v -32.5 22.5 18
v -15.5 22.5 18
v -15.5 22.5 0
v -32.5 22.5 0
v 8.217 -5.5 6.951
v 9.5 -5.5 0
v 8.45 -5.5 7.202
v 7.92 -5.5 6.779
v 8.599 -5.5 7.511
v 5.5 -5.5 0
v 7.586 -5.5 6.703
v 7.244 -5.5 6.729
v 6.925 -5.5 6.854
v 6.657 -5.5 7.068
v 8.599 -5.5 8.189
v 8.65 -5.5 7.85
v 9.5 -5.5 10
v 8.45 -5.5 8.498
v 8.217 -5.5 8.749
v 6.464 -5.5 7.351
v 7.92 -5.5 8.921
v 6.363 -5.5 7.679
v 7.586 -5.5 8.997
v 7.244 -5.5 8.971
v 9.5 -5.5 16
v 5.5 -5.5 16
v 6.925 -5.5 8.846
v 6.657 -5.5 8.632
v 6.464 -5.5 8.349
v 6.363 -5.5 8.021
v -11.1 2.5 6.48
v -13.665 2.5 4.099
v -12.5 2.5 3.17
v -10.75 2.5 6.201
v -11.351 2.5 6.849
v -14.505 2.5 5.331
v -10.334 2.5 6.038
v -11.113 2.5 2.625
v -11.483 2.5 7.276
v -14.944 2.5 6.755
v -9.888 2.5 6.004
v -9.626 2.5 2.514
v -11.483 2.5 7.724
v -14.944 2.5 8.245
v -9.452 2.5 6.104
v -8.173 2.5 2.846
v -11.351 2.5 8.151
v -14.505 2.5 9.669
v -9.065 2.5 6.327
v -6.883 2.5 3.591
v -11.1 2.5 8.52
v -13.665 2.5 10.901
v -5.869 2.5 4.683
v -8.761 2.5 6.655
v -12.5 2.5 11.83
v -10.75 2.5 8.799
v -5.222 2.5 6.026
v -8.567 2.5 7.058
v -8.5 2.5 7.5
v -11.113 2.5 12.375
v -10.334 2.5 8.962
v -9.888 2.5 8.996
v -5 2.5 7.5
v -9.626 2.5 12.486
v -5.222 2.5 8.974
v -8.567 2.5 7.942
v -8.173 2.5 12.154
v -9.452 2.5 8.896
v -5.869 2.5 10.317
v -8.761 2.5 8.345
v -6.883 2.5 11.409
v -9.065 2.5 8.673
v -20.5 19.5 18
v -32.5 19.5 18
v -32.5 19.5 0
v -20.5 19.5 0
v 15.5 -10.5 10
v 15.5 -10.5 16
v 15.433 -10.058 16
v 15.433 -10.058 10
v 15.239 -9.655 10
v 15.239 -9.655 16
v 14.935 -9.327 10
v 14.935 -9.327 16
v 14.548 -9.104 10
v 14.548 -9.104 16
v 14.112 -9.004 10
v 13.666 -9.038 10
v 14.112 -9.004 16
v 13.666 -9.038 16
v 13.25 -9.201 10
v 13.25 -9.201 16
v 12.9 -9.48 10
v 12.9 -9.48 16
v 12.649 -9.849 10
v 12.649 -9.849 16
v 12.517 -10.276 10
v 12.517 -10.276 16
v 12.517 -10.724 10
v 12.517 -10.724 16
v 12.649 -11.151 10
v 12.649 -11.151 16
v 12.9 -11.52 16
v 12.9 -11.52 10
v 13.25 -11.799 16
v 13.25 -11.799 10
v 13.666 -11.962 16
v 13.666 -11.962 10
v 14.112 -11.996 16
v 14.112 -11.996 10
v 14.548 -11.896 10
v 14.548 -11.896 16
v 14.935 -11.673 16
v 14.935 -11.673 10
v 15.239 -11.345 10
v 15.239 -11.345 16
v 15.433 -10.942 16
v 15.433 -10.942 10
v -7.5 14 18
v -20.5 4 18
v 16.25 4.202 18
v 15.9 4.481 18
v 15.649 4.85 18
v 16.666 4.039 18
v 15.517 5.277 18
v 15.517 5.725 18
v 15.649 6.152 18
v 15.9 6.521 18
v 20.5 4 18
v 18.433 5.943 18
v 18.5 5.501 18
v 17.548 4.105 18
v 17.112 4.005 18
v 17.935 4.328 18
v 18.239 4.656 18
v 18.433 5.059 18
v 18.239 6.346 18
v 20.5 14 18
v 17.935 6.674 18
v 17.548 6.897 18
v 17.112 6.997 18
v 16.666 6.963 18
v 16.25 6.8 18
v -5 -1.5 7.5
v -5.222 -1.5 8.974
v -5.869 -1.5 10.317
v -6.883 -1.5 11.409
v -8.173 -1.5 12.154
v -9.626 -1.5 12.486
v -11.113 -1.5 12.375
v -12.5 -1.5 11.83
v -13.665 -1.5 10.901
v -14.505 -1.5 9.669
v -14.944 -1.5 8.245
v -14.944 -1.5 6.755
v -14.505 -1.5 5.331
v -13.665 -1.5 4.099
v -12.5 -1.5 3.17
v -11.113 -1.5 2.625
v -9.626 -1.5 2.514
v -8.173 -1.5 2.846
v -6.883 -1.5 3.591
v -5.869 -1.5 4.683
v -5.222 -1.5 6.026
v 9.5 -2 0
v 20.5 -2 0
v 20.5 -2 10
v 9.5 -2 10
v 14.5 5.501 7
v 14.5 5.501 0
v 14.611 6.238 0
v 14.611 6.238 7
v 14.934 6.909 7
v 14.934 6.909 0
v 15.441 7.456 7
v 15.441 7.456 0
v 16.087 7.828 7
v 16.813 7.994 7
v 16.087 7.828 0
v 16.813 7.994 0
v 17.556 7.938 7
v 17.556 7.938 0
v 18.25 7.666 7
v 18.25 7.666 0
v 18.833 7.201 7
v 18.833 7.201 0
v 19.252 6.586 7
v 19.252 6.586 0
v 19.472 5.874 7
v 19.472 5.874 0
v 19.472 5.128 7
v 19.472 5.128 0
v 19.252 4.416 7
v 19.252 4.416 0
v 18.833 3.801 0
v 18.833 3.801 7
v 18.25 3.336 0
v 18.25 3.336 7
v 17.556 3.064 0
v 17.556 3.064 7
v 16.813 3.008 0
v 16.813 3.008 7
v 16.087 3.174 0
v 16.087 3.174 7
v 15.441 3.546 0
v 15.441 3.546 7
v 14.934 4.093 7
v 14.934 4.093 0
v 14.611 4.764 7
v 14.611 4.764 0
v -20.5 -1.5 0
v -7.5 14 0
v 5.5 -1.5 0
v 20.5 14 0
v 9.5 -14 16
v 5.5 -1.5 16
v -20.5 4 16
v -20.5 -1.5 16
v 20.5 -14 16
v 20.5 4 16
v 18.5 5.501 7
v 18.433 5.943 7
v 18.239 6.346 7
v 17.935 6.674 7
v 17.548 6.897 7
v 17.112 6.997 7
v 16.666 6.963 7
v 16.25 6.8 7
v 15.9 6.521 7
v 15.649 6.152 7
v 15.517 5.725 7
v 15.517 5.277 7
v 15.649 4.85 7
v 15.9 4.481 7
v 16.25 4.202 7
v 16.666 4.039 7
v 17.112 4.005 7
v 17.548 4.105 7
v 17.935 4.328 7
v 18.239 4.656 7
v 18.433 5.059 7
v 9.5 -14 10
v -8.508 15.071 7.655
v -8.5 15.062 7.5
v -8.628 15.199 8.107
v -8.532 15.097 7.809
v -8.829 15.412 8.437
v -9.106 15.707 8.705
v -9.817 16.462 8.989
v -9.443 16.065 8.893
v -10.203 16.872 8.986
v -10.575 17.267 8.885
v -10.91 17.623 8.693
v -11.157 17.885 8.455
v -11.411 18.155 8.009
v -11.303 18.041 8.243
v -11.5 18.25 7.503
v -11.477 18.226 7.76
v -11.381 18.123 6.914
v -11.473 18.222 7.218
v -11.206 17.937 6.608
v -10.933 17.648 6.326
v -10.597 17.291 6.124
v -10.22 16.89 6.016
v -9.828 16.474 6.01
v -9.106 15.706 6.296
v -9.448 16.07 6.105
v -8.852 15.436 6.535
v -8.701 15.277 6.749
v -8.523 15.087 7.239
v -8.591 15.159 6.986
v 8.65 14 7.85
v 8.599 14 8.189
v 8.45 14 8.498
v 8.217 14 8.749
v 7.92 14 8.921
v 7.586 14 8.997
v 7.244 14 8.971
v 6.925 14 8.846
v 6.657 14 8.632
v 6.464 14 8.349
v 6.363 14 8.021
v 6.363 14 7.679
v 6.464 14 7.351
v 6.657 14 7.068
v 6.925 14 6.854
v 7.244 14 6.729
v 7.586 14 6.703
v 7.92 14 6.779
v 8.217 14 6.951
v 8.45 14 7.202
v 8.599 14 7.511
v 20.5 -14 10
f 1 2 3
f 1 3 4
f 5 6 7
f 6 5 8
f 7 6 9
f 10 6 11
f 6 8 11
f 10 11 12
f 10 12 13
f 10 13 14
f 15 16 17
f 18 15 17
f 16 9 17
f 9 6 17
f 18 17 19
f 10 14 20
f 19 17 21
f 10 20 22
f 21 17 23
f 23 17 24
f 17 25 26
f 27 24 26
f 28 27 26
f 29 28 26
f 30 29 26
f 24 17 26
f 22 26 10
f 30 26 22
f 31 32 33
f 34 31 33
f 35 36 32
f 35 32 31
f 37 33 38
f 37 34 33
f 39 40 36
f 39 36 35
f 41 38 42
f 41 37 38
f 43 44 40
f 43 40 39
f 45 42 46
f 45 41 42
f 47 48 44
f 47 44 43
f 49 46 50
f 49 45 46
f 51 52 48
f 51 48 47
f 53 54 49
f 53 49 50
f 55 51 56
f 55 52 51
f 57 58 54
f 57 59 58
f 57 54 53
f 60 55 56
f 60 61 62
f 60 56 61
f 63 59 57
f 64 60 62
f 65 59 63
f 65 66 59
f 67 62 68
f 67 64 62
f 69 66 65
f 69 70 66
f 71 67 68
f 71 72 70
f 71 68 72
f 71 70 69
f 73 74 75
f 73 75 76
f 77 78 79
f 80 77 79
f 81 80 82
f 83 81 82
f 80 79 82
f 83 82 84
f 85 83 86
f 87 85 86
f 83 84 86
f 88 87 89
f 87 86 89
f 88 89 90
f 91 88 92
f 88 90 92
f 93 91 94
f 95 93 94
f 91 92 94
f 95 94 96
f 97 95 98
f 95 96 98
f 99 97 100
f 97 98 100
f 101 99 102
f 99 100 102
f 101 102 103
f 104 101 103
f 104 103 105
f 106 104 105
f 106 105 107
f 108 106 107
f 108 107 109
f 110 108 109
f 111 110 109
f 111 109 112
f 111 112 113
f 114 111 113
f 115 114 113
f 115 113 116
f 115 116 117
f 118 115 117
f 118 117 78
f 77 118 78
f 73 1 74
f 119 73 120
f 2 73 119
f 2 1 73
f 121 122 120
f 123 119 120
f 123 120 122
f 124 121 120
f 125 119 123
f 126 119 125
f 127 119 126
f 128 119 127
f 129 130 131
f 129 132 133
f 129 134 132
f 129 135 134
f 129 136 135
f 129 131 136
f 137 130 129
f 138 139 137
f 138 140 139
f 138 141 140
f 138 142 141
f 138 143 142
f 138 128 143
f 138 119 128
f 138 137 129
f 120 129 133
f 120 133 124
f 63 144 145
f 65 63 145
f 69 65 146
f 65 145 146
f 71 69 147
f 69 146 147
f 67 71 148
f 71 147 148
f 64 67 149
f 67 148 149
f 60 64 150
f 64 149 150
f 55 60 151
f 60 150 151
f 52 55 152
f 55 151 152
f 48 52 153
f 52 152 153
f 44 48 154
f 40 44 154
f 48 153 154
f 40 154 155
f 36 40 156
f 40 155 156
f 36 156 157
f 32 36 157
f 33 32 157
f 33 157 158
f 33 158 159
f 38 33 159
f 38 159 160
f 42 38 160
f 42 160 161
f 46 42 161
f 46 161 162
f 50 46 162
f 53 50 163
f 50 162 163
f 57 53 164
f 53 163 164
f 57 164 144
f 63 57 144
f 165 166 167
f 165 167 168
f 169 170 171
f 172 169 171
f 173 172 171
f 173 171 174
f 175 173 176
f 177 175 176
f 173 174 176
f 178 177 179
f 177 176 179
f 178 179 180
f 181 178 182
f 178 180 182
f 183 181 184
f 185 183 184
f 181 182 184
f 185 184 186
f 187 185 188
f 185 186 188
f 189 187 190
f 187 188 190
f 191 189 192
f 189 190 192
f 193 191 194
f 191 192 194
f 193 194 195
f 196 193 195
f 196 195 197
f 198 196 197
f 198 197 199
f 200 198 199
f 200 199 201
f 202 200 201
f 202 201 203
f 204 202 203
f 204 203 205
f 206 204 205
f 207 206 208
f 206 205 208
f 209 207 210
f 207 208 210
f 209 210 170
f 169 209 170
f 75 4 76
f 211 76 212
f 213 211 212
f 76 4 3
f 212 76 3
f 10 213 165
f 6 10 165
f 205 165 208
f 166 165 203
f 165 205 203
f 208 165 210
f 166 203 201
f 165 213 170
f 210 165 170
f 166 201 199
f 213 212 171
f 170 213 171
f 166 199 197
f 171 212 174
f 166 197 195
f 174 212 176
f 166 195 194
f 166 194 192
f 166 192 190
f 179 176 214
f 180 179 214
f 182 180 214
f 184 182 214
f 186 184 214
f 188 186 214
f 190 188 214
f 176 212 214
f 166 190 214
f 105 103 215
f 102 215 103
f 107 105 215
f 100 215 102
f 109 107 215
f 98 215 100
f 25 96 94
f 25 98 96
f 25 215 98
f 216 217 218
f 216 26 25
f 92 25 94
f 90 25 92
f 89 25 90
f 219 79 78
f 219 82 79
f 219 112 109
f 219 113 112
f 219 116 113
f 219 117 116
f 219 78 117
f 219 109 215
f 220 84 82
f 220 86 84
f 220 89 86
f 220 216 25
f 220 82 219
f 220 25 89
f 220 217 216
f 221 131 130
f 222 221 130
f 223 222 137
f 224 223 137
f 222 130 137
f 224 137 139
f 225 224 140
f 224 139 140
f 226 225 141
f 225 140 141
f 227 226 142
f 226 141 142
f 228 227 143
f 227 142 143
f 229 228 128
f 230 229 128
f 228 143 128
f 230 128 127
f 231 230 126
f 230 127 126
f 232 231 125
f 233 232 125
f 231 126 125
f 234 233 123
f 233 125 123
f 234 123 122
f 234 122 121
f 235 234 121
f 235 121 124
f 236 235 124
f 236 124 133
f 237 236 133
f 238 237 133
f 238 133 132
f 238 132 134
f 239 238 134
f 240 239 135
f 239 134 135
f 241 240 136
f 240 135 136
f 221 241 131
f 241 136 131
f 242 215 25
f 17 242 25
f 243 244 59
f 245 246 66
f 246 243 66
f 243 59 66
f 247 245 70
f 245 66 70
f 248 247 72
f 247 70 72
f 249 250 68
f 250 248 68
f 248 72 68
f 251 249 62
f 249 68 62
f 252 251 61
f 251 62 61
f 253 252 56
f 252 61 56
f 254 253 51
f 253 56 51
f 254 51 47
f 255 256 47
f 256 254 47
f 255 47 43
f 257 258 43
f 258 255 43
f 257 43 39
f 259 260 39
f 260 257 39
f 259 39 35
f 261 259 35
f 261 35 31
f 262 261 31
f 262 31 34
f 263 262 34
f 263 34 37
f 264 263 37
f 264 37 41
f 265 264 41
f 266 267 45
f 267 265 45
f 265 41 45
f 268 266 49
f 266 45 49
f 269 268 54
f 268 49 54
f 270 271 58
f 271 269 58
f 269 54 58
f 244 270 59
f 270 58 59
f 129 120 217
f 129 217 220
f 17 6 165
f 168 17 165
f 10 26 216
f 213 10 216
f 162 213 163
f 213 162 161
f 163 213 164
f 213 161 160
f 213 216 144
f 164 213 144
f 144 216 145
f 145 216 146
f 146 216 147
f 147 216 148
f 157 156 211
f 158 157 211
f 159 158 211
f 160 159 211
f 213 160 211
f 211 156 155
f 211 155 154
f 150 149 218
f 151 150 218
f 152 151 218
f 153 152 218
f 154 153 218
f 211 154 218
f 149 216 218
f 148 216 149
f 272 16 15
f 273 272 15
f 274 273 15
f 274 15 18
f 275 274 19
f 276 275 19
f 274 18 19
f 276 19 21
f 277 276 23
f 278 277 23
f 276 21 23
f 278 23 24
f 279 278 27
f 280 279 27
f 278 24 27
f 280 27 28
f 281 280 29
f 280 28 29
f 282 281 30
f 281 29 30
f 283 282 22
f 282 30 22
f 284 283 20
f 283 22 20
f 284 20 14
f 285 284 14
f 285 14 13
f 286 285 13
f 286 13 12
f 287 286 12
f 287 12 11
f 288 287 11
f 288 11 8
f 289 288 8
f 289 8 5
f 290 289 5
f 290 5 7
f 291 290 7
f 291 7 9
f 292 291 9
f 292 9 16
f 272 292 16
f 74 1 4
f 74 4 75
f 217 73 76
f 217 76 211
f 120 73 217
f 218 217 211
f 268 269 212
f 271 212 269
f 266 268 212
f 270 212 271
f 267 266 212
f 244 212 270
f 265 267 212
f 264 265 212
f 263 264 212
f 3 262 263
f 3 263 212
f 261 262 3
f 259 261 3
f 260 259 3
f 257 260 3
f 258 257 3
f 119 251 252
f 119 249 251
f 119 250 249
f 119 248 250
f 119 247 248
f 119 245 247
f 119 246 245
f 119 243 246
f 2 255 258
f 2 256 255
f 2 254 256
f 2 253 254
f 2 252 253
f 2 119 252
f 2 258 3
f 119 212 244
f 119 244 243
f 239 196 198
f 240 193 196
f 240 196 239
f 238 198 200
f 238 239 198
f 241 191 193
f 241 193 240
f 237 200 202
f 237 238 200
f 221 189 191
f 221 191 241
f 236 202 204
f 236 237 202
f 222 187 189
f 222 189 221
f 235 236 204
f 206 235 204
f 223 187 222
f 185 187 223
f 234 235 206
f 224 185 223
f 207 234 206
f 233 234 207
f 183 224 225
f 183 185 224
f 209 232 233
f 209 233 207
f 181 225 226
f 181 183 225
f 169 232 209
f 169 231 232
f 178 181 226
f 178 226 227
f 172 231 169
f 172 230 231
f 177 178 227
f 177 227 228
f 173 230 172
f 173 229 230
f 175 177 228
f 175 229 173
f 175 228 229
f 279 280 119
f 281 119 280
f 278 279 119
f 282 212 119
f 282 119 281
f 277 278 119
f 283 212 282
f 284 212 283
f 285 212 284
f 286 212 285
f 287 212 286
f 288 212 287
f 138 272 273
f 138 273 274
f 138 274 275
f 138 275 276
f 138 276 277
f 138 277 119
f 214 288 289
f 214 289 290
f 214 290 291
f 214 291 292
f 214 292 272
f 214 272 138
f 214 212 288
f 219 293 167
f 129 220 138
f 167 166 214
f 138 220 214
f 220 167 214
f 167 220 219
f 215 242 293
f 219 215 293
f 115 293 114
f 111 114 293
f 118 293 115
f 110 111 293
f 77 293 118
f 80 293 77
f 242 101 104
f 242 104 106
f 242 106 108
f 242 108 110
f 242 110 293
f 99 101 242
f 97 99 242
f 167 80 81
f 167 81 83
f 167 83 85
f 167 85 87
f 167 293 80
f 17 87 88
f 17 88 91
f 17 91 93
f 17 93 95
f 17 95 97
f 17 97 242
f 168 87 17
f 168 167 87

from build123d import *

# Parameters (mm, degrees)
SKETCH1_W           = 41
SKETCH1_H           = 28
BOSS_EXTRUDE1_DEPTH = 18
CUT_EXTRUDE1_DEPTH  = 18
BOSS_EXTRUDE2_DEPTH = 18
SKETCH4_W           = 41
SKETCH4_H           = 18
CUT_EXTRUDE2_DEPTH  = 2
SKETCH5_R           = 1.5
CUT_EXTRUDE9_DEPTH  = 11
SKETCH6_R           = 1.5
CUT_EXTRUDE10_DEPTH = 43.64387412
SKETCH7_R           = 2.5
CUT_EXTRUDE11_DEPTH = 7
SKETCH8_W           = 11
SKETCH8_H           = 12
CUT_EXTRUDE12_DEPTH = 10
SKETCH9_R           = 5
CUT_EXTRUDE13_DEPTH = 4
SKETCH10_R          = 1.5
CUT_EXTRUDE14_DEPTH = 43.1930089
SKETCH11_R          = 1.15
CUT_EXTRUDE15_DEPTH = 47.521500406


with BuildPart() as part:
    # Sketch1 → Boss-Extrude1 (new body)
    with BuildSketch(Plane.XY):
        Rectangle(SKETCH1_W, SKETCH1_H)
    extrude(amount=BOSS_EXTRUDE1_DEPTH)

    # Sketch2 → Cut-Extrude1 (cut)
    with BuildSketch(Plane.XY.offset(18)):
        Polygon((9.5, -14), (9.5, -5.5), (5.5, -5.5), (5.5, -1.5), (-20.5, -1.5), (-20.5, -14), align=None)
    extrude(amount=-CUT_EXTRUDE1_DEPTH, mode=Mode.SUBTRACT)

    # Sketch3 → Boss-Extrude2 (add)
    with BuildSketch(Plane.XY.offset(18)):
        Polygon((-20.5, 22.5), (-32.5, 22.5), (-32.5, 19.5), (-20.5, 19.5), (-20.5, 14), (-7.5, 14), (-15.5, 22.5), align=None)
    extrude(amount=-BOSS_EXTRUDE2_DEPTH)

    # Sketch4 → Cut-Extrude2 (cut)
    with BuildSketch(Plane.XY.offset(18)):
        with Locations((0, -5)):
            Rectangle(SKETCH4_W, SKETCH4_H)
    extrude(amount=-CUT_EXTRUDE2_DEPTH, mode=Mode.SUBTRACT)

    # Sketch5 → Cut-Extrude9 (cut)
    with BuildSketch(Plane.XY.offset(18)):
        with Locations((17, 5.501)):
            Circle(SKETCH5_R)
    extrude(amount=-CUT_EXTRUDE9_DEPTH, mode=Mode.SUBTRACT)

    # Sketch6 → Cut-Extrude10 (cut, through all)
    with BuildSketch(Plane.XY.offset(16)):
        with Locations((14, -10.5)):
            Circle(SKETCH6_R)
    extrude(amount=-CUT_EXTRUDE10_DEPTH, mode=Mode.SUBTRACT)

    # Sketch7 → Cut-Extrude11 (cut)
    with BuildSketch(Plane(origin=(0, 0, 0), x_dir=(-1, 0, 0), z_dir=(0, 0, -1))):
        with Locations((-17, 5.501)):
            Circle(SKETCH7_R)
    extrude(amount=-CUT_EXTRUDE11_DEPTH, mode=Mode.SUBTRACT)

    # Sketch8 → Cut-Extrude12 (cut)
    with BuildSketch(Plane(origin=(0, 0, 0), x_dir=(-1, 0, 0), z_dir=(0, 0, -1))):
        with Locations((-15, -8)):
            Rectangle(SKETCH8_W, SKETCH8_H)
    extrude(amount=-CUT_EXTRUDE12_DEPTH, mode=Mode.SUBTRACT)

    # Sketch9 → Cut-Extrude13 (cut)
    with BuildSketch(Plane.XZ.offset(1.5)):
        with Locations((-10, 7.5)):
            Circle(SKETCH9_R)
    extrude(amount=-CUT_EXTRUDE13_DEPTH, mode=Mode.SUBTRACT)

    # Sketch10 → Cut-Extrude14 (cut, through all)
    with BuildSketch(Plane.XZ.offset(-2.5)):
        with Locations((-10, 7.5)):
            Circle(SKETCH10_R)
    extrude(amount=-CUT_EXTRUDE14_DEPTH, mode=Mode.SUBTRACT)

    # Sketch11 → Cut-Extrude15 (cut, through all)
    with BuildSketch(Plane.XZ.offset(5.5)):
        with Locations((7.5, 7.85)):
            Circle(SKETCH11_R)
    extrude(amount=-CUT_EXTRUDE15_DEPTH, mode=Mode.SUBTRACT)


solid = part.part
